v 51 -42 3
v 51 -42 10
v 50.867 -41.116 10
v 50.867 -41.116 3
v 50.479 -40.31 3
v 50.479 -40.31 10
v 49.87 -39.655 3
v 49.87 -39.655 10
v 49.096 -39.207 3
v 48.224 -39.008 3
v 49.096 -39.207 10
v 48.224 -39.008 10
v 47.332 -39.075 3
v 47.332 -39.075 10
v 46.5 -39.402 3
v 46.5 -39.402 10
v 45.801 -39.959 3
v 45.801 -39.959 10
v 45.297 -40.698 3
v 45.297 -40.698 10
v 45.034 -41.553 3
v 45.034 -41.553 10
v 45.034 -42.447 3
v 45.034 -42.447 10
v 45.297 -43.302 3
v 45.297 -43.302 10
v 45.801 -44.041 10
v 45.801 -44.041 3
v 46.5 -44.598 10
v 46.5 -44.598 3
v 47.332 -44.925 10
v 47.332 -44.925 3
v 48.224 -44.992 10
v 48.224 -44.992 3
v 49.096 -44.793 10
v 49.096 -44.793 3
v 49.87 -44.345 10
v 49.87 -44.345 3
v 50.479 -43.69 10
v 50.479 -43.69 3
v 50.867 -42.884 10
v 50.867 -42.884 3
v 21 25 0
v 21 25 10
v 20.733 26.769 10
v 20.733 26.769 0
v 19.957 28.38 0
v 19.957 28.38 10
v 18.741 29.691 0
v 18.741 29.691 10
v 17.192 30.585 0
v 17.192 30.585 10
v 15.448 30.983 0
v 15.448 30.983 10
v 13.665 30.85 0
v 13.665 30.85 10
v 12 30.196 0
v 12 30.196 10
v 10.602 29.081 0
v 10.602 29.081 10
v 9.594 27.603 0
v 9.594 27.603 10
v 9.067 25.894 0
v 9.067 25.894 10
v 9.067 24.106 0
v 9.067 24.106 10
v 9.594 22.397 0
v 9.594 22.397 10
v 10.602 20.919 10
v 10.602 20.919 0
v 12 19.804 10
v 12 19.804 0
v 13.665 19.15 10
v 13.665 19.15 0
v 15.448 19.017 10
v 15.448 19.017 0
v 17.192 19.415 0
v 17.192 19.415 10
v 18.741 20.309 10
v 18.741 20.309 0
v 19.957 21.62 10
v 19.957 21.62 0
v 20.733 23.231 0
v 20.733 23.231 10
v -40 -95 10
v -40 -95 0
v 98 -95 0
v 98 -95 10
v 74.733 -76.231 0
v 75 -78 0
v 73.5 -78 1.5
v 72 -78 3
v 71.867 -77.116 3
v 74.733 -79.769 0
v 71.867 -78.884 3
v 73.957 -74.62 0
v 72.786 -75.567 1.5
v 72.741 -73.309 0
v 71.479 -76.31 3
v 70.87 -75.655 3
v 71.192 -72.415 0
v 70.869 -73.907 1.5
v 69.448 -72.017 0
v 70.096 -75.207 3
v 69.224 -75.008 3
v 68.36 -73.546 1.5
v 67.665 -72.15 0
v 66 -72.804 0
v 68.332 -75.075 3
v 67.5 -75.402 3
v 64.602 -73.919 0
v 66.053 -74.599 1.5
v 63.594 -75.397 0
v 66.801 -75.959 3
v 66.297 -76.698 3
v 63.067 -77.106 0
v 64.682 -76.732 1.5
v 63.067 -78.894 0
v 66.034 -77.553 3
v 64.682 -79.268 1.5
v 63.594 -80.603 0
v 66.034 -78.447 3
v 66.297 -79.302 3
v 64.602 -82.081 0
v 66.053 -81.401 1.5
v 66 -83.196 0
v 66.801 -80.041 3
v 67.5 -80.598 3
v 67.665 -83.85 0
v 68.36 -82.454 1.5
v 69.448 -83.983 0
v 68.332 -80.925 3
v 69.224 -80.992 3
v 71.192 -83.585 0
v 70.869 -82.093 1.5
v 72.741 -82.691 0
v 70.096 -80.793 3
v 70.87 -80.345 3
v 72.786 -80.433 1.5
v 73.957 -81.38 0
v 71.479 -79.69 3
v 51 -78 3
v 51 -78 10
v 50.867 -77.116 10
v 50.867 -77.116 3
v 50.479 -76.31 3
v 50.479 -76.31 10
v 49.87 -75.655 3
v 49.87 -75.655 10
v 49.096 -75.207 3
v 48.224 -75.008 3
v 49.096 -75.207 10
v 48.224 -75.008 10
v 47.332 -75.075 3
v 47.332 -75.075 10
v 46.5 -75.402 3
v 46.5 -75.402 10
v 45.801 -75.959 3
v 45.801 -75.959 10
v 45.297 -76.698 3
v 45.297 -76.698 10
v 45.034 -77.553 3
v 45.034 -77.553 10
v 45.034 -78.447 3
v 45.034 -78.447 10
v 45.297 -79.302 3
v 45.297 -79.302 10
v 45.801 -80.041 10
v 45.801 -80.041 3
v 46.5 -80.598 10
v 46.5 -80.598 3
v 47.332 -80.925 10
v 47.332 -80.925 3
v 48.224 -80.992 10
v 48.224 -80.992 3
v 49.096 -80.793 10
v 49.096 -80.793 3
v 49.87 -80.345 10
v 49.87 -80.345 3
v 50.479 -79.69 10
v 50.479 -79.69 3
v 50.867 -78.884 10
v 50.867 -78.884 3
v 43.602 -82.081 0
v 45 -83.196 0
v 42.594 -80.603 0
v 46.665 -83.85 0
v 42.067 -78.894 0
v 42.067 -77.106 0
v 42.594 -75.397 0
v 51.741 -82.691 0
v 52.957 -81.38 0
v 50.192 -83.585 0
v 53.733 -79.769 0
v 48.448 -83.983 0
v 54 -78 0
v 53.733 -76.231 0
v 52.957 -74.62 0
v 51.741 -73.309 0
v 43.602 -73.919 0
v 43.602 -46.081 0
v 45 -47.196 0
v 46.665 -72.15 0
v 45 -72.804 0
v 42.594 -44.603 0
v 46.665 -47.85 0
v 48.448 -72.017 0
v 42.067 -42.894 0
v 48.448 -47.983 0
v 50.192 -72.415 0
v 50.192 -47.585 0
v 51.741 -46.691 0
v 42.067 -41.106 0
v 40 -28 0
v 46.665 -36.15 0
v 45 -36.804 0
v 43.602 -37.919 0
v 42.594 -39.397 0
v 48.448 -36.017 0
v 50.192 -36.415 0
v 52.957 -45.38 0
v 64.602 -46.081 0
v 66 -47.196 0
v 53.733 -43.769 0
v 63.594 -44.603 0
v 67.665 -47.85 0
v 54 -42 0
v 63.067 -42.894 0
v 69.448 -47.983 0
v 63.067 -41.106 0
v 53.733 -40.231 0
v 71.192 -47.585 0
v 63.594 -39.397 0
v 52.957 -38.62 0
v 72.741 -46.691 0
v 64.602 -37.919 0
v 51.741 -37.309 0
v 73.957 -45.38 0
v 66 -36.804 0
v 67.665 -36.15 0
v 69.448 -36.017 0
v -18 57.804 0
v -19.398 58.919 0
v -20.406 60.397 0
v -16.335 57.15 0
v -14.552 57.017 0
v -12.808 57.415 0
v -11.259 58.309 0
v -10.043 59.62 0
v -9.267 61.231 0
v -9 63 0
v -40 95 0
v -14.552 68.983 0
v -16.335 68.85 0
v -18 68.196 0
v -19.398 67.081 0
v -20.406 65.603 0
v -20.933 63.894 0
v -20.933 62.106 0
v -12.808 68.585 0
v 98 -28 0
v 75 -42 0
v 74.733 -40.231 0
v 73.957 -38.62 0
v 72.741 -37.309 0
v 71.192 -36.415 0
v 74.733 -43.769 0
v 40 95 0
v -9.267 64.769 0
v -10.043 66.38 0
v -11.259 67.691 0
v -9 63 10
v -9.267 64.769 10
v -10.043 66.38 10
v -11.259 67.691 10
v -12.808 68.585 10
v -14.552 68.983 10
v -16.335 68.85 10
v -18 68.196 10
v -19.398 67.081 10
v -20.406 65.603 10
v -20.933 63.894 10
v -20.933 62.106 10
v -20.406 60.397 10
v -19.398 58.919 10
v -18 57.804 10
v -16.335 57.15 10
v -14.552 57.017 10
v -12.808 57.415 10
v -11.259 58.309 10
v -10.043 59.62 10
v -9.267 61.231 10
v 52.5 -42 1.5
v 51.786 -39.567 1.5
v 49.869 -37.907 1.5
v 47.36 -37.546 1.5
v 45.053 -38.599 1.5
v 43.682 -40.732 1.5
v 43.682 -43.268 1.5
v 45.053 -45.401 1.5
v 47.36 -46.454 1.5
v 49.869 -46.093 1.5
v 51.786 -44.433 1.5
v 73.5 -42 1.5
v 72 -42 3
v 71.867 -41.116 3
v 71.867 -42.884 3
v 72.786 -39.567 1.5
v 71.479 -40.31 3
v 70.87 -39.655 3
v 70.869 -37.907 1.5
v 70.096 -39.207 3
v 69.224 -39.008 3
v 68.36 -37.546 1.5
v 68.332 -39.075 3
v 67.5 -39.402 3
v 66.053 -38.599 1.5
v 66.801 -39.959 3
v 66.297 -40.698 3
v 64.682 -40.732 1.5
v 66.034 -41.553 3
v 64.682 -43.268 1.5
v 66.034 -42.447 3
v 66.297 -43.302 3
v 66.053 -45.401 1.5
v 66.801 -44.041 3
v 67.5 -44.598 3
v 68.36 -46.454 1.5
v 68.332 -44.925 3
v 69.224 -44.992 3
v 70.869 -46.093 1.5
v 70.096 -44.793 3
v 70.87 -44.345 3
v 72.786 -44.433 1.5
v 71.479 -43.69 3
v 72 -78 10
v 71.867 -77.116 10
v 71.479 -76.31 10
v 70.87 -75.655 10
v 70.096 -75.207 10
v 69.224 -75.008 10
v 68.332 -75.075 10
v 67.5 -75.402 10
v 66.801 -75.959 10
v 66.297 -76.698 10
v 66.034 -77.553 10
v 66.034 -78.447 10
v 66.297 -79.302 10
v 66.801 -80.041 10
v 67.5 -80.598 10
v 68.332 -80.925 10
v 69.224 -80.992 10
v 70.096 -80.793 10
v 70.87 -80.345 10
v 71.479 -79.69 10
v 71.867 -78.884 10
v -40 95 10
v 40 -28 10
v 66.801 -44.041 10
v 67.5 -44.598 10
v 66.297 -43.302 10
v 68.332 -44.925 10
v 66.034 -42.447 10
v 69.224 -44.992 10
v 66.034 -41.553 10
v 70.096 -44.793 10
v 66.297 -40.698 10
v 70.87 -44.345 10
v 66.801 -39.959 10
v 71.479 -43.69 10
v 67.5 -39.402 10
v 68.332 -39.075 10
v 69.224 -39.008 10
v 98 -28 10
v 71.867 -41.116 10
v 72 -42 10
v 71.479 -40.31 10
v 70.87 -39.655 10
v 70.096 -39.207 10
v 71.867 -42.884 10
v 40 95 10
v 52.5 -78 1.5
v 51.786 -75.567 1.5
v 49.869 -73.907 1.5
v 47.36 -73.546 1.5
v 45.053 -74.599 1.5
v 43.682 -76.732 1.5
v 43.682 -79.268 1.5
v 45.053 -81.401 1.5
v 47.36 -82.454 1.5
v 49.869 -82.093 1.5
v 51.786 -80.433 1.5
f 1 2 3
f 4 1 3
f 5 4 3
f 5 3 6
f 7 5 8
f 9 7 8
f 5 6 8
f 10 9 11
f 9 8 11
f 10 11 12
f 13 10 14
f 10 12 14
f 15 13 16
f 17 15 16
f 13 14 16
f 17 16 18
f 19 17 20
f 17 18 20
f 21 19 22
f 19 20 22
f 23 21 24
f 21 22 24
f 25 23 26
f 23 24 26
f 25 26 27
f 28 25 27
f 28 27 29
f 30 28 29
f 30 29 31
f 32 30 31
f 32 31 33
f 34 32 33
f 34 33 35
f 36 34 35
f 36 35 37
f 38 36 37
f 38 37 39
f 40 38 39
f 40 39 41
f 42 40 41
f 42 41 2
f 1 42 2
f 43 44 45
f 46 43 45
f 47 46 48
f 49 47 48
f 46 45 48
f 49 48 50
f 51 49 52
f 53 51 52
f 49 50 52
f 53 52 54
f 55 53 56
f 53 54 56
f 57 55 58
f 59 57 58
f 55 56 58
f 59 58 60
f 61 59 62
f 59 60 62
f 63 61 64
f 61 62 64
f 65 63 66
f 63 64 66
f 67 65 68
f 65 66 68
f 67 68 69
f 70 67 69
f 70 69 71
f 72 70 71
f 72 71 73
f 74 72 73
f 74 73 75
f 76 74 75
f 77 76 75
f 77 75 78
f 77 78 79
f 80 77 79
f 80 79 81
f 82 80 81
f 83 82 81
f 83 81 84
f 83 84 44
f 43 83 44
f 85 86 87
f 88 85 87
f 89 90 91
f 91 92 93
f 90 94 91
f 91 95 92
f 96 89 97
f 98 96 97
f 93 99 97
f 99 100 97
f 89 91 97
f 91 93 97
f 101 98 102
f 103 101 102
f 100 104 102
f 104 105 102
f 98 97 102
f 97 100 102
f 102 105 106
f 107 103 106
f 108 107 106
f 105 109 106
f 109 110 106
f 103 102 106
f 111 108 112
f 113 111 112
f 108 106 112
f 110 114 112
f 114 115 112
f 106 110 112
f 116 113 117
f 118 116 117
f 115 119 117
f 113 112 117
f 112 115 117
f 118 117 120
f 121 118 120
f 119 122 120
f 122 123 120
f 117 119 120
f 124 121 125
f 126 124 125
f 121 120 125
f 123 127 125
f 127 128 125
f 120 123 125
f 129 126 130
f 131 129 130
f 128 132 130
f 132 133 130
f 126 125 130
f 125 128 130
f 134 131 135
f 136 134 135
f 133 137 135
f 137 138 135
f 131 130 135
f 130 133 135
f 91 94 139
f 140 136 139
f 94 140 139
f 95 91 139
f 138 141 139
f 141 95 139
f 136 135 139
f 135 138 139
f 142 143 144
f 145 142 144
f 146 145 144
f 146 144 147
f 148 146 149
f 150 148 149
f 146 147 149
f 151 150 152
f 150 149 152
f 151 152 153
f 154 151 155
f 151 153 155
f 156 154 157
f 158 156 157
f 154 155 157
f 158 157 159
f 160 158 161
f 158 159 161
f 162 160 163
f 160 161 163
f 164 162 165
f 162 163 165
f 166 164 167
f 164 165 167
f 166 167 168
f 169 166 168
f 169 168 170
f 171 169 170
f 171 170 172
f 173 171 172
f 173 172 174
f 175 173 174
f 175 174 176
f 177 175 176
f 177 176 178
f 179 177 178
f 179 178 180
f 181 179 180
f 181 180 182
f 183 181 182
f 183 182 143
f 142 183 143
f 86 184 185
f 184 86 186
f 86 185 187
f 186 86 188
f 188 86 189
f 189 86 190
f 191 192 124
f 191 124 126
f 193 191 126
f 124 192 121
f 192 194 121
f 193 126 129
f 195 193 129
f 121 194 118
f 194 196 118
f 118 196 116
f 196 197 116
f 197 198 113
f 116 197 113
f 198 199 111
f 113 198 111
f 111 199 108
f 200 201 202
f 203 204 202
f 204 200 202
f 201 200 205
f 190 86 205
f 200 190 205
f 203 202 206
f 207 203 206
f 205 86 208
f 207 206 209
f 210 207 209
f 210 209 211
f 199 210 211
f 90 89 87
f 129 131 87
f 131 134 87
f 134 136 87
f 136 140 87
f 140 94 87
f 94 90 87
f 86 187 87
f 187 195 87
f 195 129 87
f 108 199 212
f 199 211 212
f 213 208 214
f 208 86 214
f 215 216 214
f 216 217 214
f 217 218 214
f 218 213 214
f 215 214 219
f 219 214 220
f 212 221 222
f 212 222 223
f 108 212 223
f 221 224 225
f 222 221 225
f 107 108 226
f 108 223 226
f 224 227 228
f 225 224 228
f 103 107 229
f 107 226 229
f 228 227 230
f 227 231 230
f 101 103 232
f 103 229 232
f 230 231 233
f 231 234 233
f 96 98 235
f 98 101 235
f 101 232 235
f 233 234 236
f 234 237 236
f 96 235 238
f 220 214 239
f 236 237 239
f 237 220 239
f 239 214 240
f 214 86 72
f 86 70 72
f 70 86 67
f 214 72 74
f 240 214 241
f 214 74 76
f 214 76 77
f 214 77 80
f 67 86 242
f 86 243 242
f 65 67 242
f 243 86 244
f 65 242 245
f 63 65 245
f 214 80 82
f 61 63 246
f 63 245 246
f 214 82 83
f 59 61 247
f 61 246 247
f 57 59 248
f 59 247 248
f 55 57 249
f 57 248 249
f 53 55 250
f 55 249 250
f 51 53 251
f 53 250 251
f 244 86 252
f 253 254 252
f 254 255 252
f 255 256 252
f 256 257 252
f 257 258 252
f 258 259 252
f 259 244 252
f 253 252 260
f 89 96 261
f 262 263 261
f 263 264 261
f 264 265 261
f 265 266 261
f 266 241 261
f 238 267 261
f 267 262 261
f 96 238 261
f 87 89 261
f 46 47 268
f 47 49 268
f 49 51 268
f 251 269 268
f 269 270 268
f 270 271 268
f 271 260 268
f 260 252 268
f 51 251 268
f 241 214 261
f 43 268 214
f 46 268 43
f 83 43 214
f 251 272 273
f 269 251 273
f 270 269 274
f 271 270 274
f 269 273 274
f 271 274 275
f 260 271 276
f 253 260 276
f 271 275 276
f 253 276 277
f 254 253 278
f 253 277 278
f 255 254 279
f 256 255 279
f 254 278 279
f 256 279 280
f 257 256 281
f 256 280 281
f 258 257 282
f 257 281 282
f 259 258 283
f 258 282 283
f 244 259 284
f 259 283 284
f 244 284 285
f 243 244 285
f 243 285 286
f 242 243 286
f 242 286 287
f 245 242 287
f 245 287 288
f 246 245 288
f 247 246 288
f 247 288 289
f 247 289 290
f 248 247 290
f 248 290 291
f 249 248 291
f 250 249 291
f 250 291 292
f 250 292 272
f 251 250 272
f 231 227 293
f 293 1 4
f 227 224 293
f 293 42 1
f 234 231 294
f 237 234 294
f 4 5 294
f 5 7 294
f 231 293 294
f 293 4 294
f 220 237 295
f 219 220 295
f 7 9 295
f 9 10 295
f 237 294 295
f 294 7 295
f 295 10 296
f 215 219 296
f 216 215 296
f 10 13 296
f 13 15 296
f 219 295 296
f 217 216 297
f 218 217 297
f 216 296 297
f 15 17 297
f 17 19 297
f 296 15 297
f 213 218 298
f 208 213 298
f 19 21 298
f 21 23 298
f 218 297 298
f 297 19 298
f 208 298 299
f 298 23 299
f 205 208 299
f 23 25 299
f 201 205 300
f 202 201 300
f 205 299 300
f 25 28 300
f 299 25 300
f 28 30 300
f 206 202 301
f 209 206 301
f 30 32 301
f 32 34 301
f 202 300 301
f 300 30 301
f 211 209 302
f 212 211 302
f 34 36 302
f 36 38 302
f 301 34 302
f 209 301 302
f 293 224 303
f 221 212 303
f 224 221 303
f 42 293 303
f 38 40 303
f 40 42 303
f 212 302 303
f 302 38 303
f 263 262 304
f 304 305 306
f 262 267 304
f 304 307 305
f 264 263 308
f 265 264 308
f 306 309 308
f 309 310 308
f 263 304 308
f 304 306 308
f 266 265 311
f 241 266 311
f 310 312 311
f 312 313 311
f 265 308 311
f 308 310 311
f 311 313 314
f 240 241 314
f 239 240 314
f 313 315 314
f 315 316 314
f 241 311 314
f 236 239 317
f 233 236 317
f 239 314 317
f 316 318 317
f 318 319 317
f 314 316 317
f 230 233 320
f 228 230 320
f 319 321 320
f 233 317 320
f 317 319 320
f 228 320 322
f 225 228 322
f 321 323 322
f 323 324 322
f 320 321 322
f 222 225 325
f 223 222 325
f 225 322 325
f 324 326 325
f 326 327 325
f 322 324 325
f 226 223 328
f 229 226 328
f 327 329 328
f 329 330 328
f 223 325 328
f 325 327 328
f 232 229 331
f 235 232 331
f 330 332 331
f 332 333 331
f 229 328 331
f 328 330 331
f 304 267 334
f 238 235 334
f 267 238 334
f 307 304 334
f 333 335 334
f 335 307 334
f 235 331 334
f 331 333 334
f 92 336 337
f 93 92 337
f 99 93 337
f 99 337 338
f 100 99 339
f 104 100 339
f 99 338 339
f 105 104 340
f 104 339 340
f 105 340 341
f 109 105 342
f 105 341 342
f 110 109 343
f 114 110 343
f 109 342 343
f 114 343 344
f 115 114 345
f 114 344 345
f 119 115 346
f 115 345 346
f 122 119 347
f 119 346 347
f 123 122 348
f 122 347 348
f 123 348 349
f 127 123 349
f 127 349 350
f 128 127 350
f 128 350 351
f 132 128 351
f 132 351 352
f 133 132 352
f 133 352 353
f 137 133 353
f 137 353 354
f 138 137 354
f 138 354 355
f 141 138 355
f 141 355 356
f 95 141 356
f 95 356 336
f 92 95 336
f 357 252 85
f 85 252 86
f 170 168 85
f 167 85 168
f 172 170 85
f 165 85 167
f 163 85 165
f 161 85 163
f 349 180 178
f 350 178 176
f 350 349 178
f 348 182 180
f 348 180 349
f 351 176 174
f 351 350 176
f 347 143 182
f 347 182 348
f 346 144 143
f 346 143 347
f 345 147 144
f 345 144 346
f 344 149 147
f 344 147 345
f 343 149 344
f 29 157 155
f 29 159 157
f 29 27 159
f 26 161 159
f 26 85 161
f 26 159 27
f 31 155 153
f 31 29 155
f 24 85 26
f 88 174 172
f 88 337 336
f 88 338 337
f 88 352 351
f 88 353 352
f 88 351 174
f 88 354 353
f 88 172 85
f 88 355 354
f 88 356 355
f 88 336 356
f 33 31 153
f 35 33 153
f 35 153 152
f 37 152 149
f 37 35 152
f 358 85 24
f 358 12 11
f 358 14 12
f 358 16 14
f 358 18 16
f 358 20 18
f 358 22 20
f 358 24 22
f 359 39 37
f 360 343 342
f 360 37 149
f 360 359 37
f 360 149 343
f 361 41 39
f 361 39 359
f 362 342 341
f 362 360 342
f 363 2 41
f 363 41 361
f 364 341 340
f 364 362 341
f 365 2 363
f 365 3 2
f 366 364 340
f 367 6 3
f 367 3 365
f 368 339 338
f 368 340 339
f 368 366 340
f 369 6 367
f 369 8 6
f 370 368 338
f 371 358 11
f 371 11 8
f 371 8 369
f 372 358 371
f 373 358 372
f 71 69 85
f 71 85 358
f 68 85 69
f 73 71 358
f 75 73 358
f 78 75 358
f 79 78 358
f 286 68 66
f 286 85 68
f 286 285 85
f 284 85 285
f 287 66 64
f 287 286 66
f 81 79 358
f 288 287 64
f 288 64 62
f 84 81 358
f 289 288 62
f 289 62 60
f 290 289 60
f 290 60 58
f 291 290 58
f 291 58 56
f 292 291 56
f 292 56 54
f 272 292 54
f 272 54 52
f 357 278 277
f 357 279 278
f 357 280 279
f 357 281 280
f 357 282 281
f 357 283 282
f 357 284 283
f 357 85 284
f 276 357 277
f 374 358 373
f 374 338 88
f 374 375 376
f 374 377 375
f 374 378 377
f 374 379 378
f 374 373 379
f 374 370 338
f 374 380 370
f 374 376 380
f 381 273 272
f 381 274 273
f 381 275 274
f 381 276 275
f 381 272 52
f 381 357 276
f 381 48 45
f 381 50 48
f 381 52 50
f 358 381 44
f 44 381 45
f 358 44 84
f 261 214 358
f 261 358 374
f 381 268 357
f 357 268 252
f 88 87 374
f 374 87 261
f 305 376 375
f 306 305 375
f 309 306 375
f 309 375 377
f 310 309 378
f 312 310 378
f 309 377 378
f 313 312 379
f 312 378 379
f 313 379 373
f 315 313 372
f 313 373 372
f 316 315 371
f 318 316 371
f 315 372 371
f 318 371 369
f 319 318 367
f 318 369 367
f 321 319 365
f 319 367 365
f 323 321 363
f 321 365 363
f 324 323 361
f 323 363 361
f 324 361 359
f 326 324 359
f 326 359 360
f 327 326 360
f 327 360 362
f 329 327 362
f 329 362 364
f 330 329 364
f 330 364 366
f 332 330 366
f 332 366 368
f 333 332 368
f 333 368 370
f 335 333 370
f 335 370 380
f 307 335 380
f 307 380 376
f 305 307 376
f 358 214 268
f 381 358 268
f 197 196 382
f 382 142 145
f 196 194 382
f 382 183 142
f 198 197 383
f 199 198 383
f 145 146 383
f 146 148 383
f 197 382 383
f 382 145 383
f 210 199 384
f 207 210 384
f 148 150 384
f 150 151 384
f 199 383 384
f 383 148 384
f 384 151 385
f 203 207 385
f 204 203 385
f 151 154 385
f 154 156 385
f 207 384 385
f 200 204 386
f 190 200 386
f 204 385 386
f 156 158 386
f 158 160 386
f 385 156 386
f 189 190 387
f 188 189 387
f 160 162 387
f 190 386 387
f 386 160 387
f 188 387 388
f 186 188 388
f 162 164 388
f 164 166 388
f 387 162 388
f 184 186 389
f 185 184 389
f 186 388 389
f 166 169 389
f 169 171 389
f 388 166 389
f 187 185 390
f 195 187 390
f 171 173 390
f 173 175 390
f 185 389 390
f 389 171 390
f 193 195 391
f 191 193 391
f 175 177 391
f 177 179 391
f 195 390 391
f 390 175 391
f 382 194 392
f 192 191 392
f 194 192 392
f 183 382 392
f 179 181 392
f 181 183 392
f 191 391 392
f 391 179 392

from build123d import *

# Parameters (mm, degrees)
F0_W     = 58
F0_H     = 67
F1_DEPTH = 10
F2_R     = 3
F2_R_2   = 6
F3_DEPTH = 25
F4_SIZE  = 3


with BuildPart() as f1:
    # F0 (on Top) → F1 (new body)
    with BuildSketch(Plane.XY):
        Polygon((-40, -95), (40, -95), (40, -28), (40, 95), (-40, 95), align=None)
        with Locations((69, -61.5)):
            Rectangle(F0_W, F0_H)
    extrude(amount=F1_DEPTH)

    # F2 (on face) → F3 (cut)
    with BuildSketch(Plane.XY.offset(10)):
        with Locations((48, -78)):
            Circle(F2_R)
        with Locations((48, -42)):
            Circle(F2_R)
        with Locations((69, -78)):
            Circle(F2_R)
        with Locations((69, -42)):
            Circle(F2_R)
        with Locations((-15, 63)):
            Circle(F2_R_2)
        with Locations((15, 25)):
            Circle(F2_R_2)
    extrude(amount=-F3_DEPTH, mode=Mode.SUBTRACT)

    # F4
    f4_edges = [f1.edges().sort_by_distance(p)[0] for p in [
        (66, -78, 0),
        (45, -78, 0),
        (45, -42, 0),
        (66, -42, 0),
    ]]
    chamfer(f4_edges, length=F4_SIZE)


solid = f1.part
